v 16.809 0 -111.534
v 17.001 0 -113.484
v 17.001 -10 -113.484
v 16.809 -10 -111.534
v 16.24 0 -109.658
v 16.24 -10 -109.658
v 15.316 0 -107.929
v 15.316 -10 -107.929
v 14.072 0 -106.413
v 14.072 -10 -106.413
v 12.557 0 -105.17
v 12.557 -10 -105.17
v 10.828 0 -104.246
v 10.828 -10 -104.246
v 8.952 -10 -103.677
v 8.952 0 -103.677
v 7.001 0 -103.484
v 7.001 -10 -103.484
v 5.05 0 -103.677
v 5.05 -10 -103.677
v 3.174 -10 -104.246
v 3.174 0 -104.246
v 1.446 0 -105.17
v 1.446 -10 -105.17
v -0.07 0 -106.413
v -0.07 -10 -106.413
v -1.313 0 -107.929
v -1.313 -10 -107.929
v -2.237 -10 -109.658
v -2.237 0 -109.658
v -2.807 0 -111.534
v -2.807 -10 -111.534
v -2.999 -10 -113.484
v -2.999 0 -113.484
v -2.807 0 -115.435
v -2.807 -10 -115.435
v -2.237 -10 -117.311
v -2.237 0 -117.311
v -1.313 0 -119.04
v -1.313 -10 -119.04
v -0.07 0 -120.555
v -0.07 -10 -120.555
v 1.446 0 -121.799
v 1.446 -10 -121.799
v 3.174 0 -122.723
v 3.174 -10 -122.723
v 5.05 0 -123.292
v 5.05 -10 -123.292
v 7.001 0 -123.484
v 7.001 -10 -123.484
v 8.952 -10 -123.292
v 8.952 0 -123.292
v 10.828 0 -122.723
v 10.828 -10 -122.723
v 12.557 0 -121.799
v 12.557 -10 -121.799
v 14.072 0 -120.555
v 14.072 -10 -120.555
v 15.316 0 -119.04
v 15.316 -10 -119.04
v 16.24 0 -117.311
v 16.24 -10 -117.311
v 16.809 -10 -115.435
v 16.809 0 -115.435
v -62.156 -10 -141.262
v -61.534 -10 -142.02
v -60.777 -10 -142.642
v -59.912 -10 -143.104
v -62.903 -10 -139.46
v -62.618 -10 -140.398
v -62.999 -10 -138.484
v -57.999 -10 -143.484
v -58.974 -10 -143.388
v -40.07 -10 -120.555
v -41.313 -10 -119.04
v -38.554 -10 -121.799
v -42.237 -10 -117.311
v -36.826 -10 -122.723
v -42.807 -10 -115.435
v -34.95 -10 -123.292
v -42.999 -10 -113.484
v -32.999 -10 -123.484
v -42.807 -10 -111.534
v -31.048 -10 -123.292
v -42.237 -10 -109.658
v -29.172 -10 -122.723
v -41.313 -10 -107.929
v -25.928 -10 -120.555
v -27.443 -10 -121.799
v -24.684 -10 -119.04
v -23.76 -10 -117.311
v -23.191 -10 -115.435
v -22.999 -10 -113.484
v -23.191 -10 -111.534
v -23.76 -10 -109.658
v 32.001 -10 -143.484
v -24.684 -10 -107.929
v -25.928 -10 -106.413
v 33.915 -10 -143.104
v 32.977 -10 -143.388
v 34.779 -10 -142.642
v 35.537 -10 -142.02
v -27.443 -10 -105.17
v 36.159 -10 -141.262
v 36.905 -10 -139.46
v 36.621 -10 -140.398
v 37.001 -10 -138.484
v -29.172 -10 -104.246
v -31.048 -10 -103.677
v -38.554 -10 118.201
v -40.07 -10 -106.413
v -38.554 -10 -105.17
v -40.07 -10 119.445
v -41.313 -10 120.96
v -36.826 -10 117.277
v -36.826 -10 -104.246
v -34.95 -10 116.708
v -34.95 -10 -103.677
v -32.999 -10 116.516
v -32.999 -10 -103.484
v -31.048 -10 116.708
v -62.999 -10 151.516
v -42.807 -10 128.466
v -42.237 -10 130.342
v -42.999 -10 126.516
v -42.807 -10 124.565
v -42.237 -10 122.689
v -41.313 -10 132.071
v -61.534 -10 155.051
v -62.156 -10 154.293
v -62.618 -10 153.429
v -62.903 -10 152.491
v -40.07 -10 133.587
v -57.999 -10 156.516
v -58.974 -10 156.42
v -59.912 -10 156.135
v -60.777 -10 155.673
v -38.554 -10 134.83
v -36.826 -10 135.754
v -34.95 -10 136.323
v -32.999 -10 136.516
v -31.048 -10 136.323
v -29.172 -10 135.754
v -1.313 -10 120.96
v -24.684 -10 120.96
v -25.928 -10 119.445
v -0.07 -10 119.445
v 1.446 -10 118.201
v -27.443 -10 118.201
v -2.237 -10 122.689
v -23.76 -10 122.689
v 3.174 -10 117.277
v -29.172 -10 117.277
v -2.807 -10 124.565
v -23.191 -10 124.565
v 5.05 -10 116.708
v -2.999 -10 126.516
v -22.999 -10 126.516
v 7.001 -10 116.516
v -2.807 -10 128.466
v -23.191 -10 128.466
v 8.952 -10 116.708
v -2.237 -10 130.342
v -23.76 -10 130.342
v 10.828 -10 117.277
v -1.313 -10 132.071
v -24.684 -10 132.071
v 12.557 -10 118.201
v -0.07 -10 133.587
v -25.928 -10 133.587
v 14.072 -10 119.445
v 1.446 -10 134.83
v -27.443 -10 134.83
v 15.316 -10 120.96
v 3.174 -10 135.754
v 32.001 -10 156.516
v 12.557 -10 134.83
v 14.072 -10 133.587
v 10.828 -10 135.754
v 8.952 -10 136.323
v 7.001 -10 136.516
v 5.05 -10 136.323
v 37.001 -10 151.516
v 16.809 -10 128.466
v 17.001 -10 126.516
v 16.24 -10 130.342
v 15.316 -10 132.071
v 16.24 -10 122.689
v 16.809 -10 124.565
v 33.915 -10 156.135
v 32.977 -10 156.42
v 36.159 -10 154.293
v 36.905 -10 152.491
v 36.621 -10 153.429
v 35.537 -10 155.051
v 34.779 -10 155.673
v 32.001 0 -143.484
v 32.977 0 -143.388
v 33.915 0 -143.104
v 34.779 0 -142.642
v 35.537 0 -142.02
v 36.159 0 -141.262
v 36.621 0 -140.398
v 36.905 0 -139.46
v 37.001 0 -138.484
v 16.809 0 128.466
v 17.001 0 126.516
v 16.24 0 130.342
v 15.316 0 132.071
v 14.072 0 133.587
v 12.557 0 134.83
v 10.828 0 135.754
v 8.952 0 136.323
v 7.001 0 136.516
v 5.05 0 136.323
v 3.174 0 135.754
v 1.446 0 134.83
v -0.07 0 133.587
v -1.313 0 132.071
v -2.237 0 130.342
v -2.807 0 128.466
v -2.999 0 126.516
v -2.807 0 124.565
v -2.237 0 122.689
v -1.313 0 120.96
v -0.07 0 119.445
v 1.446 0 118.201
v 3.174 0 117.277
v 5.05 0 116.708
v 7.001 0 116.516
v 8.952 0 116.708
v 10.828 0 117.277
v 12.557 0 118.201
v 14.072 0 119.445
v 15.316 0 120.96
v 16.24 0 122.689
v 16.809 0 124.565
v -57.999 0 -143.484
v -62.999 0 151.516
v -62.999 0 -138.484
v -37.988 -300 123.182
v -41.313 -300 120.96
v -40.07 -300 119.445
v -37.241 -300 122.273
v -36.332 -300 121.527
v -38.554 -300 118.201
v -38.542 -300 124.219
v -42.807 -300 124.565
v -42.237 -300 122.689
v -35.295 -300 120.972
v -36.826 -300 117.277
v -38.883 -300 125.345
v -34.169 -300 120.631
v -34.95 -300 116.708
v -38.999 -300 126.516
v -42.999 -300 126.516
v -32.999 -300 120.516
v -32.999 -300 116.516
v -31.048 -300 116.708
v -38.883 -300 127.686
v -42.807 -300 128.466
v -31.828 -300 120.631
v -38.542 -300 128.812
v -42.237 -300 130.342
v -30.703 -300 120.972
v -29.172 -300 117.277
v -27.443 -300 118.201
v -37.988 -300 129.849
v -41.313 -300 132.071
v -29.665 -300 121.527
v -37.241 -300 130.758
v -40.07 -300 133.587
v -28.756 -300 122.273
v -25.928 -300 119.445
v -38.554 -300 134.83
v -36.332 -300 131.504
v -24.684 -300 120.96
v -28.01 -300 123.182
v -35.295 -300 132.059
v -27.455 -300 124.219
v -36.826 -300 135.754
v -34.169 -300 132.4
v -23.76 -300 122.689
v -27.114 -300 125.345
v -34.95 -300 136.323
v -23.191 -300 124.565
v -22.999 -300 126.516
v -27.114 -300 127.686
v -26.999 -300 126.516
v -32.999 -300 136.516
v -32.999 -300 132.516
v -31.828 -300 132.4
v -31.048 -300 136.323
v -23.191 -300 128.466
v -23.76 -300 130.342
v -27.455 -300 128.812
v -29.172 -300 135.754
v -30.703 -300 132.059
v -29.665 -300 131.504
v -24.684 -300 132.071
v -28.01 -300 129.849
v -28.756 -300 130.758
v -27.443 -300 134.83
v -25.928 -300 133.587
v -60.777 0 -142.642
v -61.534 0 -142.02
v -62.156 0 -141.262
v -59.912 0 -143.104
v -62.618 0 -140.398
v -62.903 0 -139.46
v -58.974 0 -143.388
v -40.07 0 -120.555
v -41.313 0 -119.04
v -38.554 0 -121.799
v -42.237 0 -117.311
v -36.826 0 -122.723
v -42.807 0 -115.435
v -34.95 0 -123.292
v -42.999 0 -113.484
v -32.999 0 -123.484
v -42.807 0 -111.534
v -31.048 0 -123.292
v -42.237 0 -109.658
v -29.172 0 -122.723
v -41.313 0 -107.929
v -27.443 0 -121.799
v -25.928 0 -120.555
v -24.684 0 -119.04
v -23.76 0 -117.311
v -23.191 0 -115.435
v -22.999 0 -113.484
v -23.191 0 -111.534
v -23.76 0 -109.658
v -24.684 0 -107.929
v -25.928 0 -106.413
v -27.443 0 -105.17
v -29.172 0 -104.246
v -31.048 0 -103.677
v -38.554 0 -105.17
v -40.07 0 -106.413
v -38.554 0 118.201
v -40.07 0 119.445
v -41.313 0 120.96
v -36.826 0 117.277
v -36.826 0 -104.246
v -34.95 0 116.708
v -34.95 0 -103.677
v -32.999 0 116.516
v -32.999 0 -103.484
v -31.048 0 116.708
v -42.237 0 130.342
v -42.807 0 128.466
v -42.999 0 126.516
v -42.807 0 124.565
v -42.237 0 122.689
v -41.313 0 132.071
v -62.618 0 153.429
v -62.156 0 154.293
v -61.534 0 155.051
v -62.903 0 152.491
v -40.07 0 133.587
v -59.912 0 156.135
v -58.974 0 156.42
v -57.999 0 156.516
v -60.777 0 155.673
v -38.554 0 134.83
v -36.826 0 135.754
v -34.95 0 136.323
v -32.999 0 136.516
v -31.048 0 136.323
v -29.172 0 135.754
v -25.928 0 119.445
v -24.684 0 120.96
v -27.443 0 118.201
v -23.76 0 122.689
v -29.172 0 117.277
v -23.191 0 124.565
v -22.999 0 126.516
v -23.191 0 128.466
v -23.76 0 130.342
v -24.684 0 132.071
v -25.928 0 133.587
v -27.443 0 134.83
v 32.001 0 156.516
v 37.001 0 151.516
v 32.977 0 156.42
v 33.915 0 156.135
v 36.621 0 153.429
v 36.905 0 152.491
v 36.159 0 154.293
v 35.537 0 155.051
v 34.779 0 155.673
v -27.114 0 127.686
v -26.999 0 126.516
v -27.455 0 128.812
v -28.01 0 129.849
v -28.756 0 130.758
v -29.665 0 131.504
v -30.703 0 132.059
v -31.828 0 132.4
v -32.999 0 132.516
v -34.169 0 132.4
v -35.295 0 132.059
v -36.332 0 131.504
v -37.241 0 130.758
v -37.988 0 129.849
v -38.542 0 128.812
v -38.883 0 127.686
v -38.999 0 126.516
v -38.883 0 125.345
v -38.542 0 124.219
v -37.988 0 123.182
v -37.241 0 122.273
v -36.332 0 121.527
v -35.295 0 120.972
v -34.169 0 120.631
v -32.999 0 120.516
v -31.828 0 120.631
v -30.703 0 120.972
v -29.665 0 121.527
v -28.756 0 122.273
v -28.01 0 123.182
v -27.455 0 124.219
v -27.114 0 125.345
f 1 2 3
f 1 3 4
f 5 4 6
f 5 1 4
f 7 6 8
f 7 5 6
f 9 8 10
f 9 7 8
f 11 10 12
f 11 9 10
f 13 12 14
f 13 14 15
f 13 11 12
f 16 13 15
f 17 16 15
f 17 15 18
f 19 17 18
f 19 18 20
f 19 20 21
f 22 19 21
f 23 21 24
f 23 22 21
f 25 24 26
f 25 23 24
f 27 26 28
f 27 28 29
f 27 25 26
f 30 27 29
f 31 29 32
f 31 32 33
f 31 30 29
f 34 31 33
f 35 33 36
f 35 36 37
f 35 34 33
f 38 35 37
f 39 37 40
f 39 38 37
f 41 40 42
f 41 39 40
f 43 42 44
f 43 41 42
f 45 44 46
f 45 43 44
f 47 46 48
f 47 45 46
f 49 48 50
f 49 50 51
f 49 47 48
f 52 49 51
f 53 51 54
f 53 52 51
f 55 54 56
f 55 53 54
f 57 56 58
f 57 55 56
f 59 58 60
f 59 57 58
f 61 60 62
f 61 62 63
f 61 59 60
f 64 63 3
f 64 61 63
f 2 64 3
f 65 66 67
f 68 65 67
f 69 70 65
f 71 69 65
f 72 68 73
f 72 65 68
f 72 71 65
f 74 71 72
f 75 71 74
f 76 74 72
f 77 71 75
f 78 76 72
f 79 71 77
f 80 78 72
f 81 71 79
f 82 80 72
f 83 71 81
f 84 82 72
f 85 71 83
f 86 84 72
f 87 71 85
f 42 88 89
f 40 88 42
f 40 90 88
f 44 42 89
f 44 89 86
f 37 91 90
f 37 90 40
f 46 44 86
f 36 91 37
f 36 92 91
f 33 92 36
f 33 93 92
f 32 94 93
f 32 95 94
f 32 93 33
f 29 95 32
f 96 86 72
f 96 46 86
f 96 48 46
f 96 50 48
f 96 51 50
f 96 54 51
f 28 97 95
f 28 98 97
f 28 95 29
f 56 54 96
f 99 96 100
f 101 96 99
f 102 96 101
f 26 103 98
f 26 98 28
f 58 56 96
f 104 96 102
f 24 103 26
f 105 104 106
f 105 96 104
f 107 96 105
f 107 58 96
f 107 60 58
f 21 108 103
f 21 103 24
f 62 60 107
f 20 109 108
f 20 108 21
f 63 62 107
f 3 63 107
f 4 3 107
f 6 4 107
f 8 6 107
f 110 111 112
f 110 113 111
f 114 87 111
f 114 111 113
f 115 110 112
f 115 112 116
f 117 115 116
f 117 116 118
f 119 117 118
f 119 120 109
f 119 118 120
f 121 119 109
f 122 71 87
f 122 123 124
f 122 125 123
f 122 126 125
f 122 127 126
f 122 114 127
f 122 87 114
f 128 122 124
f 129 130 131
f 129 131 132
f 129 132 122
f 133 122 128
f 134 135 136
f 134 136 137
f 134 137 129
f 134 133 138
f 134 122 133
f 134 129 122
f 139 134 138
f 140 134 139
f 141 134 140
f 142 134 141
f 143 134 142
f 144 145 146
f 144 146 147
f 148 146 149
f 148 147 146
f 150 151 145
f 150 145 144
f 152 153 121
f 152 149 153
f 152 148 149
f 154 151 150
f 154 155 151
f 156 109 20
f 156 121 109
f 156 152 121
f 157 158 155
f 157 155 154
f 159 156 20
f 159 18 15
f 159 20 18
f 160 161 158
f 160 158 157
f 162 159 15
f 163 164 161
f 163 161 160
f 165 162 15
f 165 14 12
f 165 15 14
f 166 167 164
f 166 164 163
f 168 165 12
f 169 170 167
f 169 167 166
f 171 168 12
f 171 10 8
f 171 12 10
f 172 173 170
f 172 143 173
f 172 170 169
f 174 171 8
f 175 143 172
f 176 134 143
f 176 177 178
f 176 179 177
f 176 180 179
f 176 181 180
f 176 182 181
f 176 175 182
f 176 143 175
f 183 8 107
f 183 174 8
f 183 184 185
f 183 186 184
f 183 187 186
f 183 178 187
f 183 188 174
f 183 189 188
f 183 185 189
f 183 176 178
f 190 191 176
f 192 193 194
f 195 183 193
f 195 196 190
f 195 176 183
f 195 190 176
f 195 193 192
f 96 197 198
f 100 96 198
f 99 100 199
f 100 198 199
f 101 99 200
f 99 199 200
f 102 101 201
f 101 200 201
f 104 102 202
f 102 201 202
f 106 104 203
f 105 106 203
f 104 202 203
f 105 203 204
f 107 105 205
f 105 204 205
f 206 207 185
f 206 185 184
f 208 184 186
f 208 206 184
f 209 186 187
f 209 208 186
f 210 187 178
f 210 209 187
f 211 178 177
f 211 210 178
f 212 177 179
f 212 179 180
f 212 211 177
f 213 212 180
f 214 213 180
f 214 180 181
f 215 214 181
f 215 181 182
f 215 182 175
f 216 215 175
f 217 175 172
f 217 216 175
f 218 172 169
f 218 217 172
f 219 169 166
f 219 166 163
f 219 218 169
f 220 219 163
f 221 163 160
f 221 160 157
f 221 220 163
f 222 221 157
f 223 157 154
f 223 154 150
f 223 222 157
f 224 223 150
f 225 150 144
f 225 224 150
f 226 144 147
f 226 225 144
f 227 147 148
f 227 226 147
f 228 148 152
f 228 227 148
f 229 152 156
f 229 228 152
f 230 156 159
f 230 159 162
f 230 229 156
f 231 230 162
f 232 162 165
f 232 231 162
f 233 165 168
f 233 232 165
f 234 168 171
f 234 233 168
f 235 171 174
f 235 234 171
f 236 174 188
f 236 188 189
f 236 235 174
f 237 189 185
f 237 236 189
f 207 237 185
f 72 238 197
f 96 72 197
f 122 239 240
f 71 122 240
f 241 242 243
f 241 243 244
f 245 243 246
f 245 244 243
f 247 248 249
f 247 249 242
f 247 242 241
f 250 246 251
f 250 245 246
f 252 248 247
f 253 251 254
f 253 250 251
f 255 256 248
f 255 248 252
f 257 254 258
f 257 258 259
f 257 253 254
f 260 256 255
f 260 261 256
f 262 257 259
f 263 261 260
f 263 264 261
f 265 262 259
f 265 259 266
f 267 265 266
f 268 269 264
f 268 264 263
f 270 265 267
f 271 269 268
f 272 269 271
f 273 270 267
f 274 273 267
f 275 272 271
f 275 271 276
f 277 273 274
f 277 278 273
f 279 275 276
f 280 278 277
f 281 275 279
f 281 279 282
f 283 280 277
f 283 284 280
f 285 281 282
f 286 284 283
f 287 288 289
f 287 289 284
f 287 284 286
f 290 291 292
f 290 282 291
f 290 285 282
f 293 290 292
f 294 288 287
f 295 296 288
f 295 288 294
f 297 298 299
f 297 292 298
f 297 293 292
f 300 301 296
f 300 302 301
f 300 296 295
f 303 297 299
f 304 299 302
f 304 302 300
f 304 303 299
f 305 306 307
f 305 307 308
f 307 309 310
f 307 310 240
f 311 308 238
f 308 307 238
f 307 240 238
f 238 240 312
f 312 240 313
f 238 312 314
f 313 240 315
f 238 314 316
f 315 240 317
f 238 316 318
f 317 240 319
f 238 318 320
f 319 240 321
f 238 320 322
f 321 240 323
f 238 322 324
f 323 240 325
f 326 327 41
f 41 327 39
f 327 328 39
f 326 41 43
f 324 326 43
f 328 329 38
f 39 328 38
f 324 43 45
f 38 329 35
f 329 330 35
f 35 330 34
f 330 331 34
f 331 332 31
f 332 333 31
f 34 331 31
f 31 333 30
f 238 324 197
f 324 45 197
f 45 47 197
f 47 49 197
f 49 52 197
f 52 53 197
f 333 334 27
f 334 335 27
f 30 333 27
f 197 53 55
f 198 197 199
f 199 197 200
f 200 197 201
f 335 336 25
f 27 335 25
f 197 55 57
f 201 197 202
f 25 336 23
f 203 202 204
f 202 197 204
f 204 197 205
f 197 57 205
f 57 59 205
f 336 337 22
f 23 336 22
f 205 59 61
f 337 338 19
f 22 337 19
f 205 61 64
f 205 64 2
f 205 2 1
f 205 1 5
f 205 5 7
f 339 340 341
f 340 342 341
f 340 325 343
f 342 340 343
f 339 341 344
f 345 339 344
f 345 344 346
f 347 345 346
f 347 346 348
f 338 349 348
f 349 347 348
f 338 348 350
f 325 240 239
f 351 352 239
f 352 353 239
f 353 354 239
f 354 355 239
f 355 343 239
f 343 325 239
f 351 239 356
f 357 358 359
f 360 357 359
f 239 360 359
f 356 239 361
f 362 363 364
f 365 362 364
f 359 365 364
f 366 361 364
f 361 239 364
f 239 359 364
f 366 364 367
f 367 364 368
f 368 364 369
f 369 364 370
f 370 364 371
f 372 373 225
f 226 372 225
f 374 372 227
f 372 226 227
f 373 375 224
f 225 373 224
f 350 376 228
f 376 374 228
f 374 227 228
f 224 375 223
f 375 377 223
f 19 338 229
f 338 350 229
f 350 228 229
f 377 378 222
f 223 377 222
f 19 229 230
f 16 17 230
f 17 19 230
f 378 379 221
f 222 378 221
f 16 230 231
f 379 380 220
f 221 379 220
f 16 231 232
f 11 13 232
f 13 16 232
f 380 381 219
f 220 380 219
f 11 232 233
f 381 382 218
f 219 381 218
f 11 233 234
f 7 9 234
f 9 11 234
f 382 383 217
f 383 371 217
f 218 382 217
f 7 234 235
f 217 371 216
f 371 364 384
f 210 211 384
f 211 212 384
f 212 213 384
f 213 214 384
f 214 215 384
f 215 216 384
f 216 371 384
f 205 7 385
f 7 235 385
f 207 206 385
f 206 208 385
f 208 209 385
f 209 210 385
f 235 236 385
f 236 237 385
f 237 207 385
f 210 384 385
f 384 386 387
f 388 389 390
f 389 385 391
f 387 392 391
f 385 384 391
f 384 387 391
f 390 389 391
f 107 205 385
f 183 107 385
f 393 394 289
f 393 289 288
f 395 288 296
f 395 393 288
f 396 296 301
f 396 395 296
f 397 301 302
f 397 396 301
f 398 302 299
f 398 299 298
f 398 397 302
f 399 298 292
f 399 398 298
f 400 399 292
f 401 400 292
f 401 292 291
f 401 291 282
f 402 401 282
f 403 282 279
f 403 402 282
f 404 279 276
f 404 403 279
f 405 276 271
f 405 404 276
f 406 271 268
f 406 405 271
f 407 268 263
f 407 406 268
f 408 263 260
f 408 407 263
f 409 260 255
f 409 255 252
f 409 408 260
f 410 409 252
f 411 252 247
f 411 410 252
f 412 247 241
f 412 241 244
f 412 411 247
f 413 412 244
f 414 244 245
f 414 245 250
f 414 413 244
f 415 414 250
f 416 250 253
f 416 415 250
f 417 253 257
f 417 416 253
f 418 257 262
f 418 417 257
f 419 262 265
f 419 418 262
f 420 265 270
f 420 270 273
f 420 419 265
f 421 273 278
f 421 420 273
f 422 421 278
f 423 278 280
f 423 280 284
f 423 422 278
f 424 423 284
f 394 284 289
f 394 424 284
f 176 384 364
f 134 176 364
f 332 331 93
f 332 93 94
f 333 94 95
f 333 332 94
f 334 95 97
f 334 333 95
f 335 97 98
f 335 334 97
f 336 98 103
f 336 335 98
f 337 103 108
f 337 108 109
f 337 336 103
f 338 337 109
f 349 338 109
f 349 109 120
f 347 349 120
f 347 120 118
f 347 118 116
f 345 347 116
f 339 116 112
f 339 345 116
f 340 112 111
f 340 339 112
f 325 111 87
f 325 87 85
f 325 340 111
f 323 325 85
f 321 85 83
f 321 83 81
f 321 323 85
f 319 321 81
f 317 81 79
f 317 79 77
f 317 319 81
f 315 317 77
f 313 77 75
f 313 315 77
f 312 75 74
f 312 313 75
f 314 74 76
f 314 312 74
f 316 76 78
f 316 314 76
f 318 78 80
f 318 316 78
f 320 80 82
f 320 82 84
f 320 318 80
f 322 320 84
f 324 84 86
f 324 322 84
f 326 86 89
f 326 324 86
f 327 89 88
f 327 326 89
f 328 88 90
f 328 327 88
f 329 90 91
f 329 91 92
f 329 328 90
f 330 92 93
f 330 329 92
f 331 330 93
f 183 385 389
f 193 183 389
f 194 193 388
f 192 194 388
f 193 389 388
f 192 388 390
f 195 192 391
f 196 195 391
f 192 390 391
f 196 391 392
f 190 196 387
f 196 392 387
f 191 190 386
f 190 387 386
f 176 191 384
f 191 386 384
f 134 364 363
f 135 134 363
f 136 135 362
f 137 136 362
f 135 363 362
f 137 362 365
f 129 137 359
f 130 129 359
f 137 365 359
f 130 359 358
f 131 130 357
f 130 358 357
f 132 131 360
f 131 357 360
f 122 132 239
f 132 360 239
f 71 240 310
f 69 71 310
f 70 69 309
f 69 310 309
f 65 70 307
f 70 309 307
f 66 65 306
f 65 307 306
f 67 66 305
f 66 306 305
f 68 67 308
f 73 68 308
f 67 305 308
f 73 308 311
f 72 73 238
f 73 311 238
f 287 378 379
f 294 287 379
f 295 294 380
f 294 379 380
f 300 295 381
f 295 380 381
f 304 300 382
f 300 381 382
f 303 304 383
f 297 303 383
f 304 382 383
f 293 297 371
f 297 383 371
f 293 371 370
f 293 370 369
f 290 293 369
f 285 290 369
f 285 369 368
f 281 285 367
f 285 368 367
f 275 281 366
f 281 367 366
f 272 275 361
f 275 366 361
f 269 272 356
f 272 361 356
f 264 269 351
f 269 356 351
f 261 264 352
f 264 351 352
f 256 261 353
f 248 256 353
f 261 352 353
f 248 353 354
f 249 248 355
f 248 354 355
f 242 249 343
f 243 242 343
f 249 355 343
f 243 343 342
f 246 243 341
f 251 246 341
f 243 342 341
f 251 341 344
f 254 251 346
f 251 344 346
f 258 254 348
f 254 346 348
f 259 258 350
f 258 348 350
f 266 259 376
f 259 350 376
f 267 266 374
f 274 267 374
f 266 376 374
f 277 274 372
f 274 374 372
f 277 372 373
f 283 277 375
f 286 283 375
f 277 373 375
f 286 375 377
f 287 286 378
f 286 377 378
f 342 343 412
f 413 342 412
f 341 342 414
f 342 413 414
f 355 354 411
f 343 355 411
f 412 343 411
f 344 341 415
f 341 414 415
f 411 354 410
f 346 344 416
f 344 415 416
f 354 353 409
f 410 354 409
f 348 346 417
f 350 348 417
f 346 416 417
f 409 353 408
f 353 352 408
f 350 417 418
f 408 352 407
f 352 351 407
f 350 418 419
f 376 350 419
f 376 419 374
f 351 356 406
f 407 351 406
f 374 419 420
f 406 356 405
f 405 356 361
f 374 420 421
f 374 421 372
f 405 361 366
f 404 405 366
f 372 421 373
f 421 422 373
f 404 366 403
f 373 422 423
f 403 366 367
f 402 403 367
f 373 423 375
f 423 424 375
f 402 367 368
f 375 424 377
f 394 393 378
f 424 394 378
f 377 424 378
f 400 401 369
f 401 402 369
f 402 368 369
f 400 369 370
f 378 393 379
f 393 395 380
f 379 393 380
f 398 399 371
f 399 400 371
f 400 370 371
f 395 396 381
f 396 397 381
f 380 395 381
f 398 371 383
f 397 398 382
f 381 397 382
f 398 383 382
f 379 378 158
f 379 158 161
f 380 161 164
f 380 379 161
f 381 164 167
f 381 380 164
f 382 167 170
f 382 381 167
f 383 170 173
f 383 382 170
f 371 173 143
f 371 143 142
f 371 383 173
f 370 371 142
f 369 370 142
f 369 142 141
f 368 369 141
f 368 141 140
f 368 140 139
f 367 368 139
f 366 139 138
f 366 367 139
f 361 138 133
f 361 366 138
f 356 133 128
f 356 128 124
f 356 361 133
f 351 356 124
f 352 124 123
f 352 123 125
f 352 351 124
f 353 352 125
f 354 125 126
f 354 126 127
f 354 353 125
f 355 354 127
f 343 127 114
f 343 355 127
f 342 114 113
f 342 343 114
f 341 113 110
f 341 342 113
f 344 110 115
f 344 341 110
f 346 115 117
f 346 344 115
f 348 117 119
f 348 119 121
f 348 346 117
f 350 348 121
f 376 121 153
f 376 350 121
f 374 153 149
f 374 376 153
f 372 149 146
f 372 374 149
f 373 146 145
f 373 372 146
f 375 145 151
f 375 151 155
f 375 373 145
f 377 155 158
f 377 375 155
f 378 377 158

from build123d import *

# Parameters (mm, degrees)
F0_R     = 10
F1_DEPTH = 10
F0_R_2   = 6
F2_DEPTH = 300


with BuildPart() as f1:
    # F0 (on Front) → F1 (new body)
    with BuildSketch(Plane.XZ):
        with BuildLine():
            Line((32.001312, 156.515578), (-57.998688, 156.515578))
            ThreePointArc((-57.998688, 156.515578), (-61.534222, 155.051112), (-62.998688, 151.515578))
            Line((-62.998688, 151.515578), (-62.998688, -138.484422))
            ThreePointArc((-62.998688, -138.484422), (-61.534222, -142.019956), (-57.998688, -143.484422))
            Line((-57.998688, -143.484422), (32.001312, -143.484422))
            ThreePointArc((32.001312, -143.484422), (35.536846, -142.019956), (37.001312, -138.484422))
            Line((37.001312, -138.484422), (37.001312, 151.515578))
            ThreePointArc((37.001312, 151.515578), (35.536846, 155.051112), (32.001312, 156.515578))
        make_face()
        with Locations((-32.998688, -113.484422)):
            Circle(F0_R, mode=Mode.SUBTRACT)
        with Locations((7.001312, -113.484422)):
            Circle(F0_R, mode=Mode.SUBTRACT)
        with Locations((-32.998688, 126.515578)):
            Circle(F0_R, mode=Mode.SUBTRACT)
        with Locations((7.001312, 126.515578)):
            Circle(F0_R, mode=Mode.SUBTRACT)
    extrude(amount=F1_DEPTH)


with BuildPart() as f2:
    # F0 (on Front) → F2 (new body)
    with BuildSketch(Plane.XZ):
        with Locations((-32.998688, 126.515578)):
            Circle(F0_R)
        with Locations((-32.998688, 126.515578)):
            Circle(F0_R_2, mode=Mode.SUBTRACT)
    extrude(amount=F2_DEPTH)


solid = Compound([f1.part, f2.part])
